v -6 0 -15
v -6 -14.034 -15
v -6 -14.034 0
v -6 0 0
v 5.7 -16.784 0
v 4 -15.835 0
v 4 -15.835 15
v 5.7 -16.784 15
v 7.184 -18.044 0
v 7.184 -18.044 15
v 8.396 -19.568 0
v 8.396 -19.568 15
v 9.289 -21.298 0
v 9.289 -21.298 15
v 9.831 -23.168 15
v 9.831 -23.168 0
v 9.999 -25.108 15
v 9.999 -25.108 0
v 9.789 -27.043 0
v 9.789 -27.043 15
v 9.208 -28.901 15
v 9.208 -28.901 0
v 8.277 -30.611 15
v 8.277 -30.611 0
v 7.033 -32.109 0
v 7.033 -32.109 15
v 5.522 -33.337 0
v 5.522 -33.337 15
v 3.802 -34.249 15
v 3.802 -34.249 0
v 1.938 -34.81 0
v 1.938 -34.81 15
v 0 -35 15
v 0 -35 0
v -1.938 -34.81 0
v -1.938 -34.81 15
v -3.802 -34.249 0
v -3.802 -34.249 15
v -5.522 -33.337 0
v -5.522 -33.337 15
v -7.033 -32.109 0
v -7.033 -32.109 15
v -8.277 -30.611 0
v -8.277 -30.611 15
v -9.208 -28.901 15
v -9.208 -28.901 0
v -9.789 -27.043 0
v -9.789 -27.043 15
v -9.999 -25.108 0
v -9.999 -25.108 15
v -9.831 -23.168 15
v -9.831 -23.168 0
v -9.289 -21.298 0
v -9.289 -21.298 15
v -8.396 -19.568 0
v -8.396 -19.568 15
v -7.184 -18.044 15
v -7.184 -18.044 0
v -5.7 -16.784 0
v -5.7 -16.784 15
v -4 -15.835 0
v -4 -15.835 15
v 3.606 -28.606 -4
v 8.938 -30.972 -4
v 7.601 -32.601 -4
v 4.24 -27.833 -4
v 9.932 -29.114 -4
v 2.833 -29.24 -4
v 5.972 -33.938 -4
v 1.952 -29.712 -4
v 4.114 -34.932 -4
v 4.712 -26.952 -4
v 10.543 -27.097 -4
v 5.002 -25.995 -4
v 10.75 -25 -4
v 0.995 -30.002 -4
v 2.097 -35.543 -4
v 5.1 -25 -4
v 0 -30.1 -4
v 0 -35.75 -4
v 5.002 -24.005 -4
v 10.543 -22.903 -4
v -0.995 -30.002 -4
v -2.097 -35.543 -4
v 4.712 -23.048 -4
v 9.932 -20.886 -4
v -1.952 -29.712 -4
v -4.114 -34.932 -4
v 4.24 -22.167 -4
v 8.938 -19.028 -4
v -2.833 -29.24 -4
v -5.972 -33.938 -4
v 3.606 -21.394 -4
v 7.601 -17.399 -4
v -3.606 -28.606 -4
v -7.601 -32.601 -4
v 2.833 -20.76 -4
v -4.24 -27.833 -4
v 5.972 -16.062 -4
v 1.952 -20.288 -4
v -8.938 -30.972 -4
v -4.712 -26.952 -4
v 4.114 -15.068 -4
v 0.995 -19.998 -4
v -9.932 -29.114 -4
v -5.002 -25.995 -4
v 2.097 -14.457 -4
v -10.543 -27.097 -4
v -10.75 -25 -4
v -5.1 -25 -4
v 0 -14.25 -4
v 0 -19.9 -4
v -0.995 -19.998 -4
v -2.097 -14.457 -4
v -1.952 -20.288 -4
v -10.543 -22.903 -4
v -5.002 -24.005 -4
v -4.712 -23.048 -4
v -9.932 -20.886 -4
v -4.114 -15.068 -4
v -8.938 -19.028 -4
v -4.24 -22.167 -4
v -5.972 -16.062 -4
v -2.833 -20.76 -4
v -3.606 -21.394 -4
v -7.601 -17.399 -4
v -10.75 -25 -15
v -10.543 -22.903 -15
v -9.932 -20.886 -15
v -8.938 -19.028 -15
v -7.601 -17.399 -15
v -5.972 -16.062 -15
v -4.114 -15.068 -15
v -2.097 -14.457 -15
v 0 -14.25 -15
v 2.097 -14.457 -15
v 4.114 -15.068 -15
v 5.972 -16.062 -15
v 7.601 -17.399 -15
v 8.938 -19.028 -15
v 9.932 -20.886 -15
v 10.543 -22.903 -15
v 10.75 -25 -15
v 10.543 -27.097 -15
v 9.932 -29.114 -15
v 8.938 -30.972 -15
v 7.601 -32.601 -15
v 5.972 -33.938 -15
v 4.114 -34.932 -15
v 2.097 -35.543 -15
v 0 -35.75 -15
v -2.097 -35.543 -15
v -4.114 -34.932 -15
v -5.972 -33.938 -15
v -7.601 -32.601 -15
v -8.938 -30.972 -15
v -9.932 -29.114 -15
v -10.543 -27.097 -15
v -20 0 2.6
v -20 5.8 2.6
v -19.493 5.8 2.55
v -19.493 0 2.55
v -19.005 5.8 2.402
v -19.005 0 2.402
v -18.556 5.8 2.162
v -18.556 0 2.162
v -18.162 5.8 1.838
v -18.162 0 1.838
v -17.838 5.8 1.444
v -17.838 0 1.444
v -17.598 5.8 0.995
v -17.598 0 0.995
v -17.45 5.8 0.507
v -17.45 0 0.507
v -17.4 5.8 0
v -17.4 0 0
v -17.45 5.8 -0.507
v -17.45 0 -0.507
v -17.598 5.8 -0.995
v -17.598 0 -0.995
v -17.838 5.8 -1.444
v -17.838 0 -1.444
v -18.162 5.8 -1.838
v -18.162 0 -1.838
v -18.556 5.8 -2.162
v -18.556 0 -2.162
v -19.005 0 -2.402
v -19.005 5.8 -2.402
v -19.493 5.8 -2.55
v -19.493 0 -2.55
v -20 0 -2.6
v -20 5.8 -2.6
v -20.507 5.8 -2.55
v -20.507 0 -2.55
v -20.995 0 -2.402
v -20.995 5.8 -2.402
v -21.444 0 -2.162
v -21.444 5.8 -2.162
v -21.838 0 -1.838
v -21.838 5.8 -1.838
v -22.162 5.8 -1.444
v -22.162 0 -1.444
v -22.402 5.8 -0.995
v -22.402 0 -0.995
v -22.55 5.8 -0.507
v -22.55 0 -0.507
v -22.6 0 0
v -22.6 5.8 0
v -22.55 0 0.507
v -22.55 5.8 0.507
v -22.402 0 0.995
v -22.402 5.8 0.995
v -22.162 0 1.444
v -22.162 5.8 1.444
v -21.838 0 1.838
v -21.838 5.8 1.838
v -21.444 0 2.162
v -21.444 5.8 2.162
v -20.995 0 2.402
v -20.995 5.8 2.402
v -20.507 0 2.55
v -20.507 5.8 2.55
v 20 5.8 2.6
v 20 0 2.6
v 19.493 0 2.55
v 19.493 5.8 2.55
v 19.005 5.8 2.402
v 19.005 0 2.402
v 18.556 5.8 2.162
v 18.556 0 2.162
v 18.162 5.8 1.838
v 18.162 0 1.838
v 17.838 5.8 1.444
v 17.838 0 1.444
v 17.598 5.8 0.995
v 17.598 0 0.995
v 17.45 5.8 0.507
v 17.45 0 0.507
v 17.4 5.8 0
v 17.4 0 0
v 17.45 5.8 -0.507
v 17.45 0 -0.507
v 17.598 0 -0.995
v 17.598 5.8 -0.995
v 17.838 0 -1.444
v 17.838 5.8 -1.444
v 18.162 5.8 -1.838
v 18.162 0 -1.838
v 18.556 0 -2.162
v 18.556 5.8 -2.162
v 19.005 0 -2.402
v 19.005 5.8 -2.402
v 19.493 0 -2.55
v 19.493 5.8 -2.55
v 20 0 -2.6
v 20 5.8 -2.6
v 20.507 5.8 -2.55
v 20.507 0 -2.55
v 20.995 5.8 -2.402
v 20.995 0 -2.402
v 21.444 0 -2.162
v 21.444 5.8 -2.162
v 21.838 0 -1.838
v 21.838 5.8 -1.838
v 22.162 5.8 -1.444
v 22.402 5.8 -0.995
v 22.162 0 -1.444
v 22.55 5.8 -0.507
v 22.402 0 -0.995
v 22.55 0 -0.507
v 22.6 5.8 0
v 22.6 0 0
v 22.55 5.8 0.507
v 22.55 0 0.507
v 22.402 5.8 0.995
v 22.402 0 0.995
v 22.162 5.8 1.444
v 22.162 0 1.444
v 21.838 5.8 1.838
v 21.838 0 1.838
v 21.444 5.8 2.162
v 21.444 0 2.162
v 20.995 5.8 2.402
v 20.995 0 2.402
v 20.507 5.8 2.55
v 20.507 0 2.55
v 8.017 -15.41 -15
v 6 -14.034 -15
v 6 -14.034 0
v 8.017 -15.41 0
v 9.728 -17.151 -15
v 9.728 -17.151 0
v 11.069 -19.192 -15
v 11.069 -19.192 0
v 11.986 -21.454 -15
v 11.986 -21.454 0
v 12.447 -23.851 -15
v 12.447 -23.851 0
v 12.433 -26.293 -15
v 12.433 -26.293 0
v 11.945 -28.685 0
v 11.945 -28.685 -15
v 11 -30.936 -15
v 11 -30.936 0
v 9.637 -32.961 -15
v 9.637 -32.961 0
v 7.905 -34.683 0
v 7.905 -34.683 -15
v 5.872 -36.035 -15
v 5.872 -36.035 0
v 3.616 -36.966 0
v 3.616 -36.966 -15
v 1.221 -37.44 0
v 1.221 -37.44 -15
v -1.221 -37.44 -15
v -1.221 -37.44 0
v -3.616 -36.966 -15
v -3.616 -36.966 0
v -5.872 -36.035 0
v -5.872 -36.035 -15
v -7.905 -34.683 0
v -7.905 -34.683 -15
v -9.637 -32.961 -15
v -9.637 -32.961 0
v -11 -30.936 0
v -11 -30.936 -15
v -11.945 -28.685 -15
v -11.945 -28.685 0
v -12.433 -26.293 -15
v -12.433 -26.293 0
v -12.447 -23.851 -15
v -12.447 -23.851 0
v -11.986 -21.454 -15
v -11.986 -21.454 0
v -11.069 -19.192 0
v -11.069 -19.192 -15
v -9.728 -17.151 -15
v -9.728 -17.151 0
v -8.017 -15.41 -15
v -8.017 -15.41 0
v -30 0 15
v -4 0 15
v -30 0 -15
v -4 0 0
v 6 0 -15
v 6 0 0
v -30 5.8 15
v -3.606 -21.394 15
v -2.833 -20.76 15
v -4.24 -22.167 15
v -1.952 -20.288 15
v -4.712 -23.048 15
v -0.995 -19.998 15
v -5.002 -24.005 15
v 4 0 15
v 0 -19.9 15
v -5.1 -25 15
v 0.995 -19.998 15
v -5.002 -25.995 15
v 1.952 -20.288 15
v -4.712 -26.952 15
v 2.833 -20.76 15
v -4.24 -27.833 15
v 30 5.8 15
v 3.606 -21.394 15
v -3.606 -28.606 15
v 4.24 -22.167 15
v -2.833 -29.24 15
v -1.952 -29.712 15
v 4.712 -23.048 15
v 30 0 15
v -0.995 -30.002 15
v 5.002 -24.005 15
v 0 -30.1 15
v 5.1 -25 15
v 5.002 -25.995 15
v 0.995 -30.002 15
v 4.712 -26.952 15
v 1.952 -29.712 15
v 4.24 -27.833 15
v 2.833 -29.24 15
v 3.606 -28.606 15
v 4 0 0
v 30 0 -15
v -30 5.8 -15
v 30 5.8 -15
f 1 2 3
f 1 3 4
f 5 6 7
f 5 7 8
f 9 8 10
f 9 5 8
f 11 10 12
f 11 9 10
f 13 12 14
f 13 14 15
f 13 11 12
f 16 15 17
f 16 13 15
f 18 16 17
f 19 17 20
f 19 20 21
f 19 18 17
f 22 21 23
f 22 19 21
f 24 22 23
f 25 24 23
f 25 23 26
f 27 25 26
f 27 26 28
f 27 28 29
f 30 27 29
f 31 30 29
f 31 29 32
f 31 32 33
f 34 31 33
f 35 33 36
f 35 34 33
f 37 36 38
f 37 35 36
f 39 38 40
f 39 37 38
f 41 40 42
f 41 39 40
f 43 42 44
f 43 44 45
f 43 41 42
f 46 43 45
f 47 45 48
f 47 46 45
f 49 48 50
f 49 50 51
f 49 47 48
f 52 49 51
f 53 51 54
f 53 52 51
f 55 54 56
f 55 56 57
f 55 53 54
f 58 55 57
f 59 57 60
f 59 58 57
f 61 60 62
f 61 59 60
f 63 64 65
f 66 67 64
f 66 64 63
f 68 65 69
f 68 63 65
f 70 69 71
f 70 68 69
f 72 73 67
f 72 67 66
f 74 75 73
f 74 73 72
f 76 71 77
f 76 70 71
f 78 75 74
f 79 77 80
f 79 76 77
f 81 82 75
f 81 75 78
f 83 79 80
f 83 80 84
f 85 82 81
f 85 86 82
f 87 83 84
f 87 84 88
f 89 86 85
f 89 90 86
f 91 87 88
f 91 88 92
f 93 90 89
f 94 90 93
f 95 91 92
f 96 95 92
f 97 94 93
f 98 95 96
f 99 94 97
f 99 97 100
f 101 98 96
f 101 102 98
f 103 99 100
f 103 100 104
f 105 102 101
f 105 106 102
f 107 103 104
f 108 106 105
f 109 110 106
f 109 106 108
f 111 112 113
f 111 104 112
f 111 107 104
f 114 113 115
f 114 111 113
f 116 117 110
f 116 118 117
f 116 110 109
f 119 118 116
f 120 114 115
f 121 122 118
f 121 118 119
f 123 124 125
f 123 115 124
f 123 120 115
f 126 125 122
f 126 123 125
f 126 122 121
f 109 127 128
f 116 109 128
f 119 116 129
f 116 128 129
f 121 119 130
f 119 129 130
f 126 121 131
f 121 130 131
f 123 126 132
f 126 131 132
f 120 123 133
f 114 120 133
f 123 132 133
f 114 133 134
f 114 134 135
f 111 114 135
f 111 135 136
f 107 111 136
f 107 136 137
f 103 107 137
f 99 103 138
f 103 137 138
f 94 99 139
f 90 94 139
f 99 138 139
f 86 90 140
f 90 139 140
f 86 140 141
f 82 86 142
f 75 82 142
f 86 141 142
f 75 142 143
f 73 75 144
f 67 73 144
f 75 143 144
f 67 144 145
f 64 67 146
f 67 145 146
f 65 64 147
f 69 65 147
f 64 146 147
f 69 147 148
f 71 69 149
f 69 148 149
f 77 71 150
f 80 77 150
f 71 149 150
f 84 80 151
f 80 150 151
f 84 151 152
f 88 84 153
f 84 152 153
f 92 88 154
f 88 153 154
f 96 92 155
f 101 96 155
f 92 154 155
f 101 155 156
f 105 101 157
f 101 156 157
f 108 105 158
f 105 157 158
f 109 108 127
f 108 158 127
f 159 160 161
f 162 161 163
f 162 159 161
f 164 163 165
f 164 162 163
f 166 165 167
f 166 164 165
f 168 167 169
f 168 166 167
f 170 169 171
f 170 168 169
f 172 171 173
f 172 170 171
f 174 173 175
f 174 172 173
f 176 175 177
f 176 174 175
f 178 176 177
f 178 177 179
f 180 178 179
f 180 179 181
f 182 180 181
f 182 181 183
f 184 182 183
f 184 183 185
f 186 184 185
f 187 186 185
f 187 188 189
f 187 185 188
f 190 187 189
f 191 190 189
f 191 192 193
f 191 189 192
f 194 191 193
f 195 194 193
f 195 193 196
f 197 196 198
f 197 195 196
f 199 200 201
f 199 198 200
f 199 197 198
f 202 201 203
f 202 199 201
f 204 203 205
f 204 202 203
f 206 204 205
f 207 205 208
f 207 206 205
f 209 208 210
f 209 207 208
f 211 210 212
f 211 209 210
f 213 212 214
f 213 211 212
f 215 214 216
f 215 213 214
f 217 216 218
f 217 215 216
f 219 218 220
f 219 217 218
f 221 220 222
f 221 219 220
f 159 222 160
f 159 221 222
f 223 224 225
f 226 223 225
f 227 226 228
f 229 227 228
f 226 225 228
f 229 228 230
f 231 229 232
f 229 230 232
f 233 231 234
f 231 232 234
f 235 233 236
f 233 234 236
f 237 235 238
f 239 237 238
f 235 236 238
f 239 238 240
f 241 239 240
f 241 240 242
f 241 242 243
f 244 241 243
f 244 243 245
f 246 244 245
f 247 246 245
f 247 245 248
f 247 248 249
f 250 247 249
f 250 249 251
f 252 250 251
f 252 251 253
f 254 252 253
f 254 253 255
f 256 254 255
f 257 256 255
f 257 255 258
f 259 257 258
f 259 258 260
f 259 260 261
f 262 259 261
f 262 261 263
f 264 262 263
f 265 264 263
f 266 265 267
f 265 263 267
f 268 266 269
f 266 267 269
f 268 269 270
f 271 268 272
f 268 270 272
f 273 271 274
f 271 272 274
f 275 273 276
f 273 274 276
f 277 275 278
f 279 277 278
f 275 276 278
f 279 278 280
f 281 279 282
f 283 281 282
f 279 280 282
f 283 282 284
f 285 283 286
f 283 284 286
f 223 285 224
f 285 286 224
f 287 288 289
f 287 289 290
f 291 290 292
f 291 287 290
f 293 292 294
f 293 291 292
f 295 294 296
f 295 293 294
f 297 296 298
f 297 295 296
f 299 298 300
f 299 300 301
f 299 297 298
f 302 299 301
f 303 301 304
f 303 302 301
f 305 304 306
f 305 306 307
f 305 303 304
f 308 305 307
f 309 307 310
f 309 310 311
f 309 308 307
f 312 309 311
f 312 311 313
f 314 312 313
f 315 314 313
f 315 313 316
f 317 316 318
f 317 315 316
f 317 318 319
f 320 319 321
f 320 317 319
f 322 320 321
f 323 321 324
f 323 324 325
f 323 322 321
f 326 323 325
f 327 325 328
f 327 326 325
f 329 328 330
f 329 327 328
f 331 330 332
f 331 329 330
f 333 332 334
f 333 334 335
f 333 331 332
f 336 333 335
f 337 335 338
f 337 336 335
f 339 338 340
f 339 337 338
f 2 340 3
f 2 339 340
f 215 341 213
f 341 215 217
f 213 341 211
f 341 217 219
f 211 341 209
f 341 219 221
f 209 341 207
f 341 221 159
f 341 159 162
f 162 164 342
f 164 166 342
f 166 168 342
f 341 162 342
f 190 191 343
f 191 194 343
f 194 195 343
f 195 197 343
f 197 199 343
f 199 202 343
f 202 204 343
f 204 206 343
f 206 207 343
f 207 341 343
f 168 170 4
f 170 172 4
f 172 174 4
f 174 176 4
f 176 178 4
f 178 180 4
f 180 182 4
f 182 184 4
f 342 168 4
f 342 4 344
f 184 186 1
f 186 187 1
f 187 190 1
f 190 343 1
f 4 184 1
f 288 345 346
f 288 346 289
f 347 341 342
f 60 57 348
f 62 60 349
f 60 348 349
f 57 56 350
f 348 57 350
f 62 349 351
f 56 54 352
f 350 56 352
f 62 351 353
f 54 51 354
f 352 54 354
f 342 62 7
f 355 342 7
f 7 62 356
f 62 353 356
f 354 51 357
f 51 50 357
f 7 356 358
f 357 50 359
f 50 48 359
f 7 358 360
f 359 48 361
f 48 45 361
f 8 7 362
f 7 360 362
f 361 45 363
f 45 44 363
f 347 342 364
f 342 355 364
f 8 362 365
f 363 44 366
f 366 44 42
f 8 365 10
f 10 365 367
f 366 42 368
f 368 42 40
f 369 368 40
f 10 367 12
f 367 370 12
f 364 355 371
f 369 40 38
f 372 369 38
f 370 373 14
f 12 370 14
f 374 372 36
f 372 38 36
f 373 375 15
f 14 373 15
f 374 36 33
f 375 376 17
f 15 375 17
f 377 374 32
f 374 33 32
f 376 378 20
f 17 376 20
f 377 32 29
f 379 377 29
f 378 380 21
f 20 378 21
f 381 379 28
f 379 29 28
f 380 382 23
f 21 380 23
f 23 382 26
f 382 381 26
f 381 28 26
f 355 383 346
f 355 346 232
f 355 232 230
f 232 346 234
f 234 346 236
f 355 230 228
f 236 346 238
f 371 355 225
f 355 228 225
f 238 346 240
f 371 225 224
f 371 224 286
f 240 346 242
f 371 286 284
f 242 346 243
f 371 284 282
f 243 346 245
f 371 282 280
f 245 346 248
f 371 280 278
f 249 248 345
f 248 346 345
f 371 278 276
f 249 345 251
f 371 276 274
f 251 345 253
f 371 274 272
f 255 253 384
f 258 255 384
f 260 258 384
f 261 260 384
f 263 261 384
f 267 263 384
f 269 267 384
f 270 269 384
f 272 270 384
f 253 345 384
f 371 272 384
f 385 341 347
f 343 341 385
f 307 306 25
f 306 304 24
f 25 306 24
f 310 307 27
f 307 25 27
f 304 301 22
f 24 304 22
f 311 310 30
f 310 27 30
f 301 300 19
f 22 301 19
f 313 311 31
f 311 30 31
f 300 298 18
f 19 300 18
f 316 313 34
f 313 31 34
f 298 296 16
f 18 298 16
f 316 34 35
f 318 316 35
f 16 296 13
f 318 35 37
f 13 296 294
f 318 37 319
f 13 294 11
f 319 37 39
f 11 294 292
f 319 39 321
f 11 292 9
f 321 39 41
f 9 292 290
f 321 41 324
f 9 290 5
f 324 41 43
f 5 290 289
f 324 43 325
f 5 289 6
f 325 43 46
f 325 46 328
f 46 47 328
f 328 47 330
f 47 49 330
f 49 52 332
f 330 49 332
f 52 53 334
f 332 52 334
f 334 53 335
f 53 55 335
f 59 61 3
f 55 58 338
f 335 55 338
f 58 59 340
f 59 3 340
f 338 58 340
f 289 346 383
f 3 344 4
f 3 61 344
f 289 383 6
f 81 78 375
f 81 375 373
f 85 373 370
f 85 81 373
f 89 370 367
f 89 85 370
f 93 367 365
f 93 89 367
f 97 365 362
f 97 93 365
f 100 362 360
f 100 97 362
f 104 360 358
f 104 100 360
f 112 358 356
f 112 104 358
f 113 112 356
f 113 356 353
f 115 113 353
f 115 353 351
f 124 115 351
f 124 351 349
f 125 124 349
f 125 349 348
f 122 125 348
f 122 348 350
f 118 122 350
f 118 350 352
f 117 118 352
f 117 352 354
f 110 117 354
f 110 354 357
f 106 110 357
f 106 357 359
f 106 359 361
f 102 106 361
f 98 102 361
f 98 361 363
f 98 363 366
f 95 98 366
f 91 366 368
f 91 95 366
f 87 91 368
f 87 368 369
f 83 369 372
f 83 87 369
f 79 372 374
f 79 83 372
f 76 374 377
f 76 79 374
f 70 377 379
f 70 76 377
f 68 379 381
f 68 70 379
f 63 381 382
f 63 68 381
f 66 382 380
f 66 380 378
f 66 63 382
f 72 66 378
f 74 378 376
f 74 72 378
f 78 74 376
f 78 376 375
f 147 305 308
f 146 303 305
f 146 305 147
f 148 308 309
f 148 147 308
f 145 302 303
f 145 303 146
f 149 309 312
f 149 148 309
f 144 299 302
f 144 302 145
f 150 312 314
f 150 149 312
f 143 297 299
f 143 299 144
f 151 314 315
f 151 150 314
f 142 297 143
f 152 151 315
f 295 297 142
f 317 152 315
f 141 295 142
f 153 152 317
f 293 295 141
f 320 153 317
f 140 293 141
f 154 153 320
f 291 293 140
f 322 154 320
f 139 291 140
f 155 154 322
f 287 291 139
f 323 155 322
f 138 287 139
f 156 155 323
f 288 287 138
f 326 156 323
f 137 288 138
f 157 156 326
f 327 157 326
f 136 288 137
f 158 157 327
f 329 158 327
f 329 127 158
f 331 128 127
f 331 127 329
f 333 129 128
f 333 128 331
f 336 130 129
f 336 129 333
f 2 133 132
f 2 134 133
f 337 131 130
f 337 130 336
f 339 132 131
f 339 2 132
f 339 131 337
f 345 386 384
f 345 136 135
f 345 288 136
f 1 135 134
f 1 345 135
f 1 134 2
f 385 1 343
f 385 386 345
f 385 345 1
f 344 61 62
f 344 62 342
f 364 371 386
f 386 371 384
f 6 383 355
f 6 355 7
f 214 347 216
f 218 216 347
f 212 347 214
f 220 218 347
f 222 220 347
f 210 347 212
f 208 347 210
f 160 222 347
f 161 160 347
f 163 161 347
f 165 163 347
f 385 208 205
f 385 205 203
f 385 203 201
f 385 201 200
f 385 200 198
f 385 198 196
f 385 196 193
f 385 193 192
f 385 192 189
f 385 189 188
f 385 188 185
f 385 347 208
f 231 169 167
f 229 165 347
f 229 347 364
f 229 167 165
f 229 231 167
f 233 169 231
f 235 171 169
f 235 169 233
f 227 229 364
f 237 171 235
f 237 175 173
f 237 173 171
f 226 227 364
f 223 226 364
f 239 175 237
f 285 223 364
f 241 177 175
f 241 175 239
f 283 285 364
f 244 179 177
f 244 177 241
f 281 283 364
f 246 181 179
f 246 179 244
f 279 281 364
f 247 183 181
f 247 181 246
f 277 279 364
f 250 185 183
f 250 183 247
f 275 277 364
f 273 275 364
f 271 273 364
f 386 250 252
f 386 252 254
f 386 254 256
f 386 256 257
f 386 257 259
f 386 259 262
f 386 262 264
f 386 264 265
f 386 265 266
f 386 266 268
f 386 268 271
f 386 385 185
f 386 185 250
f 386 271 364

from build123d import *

# Parameters (mm, degrees)
SKETCH1_W           = 60
SKETCH1_H           = 30
BOSS_EXTRUDE1_DEPTH = 5.8
SKETCH2_R           = 2.6
CUT_EXTRUDE1_DEPTH  = 6
SKETCH3_R           = 5.1
BOSS_EXTRUDE2_DEPTH = 15
BOSS_EXTRUDE3_START = -15
SKETCH4_R           = 5.1
BOSS_EXTRUDE3_DEPTH = 15
SKETCH5_R           = 10.75
CUT_EXTRUDE2_DEPTH  = 11


with BuildPart() as part:
    # Sketch1 → Boss-Extrude1 (new body)
    with BuildSketch(Plane(origin=(0, 0, 0), x_dir=(1, 0, 0), z_dir=(0, 1, 0))):
        Rectangle(SKETCH1_W, SKETCH1_H)
    extrude(amount=BOSS_EXTRUDE1_DEPTH)

    # Sketch2 → Cut-Extrude1 (cut)
    with BuildSketch(Plane(origin=(0, 0, 0), x_dir=(1, 0, 0), z_dir=(0, 1, 0))):
        with Locations(Location((-20, 0, 0), (0, 0, 270))):
            Circle(SKETCH2_R)
    cut_extrude1 = extrude(amount=CUT_EXTRUDE1_DEPTH, mode=Mode.SUBTRACT)

    # Mirror1: Cut-Extrude1 across plane
    add(cut_extrude1.mirror(Plane(origin=(0, 0, 0), x_dir=(0, 0, 1), z_dir=(1, 0, 0))), mode=Mode.SUBTRACT)

    # Sketch3 → Boss-Extrude2 (add)
    with BuildSketch(Plane.XY):
        with BuildLine():
            Line((-4, 0), (4, 0))
            Line((4, 0), (4, -15.83484861))
            ThreePointArc((4, -15.83484861), (0, -35), (-4, -15.83484861))
            Line((-4, -15.83484861), (-4, 0))
        make_face()
        with Locations((0, -25)):
            Circle(SKETCH3_R, mode=Mode.SUBTRACT)
    extrude(amount=BOSS_EXTRUDE2_DEPTH)

    # Sketch4 → Boss-Extrude3 (add)
    with BuildSketch(Plane.XY.offset(BOSS_EXTRUDE3_START)):
        with BuildLine():
            Line((-6, -14.0341439), (-6, 0))
            Line((-6, 0), (6, 0))
            Line((6, 0), (6, -14.0341439))
            ThreePointArc((6, -14.0341439), (0, -37.5), (-6, -14.0341439))
        make_face()
        with Locations((0, -25)):
            Circle(SKETCH4_R, mode=Mode.SUBTRACT)
    extrude(amount=BOSS_EXTRUDE3_DEPTH)

    # Sketch5 → Cut-Extrude2 (cut)
    with BuildSketch(Plane(origin=(0, 0, -15), x_dir=(-1, 0, 0), z_dir=(0, 0, -1))):
        with Locations((0, -25)):
            Circle(SKETCH5_R)
    extrude(amount=-CUT_EXTRUDE2_DEPTH, mode=Mode.SUBTRACT)


solid = part.part
